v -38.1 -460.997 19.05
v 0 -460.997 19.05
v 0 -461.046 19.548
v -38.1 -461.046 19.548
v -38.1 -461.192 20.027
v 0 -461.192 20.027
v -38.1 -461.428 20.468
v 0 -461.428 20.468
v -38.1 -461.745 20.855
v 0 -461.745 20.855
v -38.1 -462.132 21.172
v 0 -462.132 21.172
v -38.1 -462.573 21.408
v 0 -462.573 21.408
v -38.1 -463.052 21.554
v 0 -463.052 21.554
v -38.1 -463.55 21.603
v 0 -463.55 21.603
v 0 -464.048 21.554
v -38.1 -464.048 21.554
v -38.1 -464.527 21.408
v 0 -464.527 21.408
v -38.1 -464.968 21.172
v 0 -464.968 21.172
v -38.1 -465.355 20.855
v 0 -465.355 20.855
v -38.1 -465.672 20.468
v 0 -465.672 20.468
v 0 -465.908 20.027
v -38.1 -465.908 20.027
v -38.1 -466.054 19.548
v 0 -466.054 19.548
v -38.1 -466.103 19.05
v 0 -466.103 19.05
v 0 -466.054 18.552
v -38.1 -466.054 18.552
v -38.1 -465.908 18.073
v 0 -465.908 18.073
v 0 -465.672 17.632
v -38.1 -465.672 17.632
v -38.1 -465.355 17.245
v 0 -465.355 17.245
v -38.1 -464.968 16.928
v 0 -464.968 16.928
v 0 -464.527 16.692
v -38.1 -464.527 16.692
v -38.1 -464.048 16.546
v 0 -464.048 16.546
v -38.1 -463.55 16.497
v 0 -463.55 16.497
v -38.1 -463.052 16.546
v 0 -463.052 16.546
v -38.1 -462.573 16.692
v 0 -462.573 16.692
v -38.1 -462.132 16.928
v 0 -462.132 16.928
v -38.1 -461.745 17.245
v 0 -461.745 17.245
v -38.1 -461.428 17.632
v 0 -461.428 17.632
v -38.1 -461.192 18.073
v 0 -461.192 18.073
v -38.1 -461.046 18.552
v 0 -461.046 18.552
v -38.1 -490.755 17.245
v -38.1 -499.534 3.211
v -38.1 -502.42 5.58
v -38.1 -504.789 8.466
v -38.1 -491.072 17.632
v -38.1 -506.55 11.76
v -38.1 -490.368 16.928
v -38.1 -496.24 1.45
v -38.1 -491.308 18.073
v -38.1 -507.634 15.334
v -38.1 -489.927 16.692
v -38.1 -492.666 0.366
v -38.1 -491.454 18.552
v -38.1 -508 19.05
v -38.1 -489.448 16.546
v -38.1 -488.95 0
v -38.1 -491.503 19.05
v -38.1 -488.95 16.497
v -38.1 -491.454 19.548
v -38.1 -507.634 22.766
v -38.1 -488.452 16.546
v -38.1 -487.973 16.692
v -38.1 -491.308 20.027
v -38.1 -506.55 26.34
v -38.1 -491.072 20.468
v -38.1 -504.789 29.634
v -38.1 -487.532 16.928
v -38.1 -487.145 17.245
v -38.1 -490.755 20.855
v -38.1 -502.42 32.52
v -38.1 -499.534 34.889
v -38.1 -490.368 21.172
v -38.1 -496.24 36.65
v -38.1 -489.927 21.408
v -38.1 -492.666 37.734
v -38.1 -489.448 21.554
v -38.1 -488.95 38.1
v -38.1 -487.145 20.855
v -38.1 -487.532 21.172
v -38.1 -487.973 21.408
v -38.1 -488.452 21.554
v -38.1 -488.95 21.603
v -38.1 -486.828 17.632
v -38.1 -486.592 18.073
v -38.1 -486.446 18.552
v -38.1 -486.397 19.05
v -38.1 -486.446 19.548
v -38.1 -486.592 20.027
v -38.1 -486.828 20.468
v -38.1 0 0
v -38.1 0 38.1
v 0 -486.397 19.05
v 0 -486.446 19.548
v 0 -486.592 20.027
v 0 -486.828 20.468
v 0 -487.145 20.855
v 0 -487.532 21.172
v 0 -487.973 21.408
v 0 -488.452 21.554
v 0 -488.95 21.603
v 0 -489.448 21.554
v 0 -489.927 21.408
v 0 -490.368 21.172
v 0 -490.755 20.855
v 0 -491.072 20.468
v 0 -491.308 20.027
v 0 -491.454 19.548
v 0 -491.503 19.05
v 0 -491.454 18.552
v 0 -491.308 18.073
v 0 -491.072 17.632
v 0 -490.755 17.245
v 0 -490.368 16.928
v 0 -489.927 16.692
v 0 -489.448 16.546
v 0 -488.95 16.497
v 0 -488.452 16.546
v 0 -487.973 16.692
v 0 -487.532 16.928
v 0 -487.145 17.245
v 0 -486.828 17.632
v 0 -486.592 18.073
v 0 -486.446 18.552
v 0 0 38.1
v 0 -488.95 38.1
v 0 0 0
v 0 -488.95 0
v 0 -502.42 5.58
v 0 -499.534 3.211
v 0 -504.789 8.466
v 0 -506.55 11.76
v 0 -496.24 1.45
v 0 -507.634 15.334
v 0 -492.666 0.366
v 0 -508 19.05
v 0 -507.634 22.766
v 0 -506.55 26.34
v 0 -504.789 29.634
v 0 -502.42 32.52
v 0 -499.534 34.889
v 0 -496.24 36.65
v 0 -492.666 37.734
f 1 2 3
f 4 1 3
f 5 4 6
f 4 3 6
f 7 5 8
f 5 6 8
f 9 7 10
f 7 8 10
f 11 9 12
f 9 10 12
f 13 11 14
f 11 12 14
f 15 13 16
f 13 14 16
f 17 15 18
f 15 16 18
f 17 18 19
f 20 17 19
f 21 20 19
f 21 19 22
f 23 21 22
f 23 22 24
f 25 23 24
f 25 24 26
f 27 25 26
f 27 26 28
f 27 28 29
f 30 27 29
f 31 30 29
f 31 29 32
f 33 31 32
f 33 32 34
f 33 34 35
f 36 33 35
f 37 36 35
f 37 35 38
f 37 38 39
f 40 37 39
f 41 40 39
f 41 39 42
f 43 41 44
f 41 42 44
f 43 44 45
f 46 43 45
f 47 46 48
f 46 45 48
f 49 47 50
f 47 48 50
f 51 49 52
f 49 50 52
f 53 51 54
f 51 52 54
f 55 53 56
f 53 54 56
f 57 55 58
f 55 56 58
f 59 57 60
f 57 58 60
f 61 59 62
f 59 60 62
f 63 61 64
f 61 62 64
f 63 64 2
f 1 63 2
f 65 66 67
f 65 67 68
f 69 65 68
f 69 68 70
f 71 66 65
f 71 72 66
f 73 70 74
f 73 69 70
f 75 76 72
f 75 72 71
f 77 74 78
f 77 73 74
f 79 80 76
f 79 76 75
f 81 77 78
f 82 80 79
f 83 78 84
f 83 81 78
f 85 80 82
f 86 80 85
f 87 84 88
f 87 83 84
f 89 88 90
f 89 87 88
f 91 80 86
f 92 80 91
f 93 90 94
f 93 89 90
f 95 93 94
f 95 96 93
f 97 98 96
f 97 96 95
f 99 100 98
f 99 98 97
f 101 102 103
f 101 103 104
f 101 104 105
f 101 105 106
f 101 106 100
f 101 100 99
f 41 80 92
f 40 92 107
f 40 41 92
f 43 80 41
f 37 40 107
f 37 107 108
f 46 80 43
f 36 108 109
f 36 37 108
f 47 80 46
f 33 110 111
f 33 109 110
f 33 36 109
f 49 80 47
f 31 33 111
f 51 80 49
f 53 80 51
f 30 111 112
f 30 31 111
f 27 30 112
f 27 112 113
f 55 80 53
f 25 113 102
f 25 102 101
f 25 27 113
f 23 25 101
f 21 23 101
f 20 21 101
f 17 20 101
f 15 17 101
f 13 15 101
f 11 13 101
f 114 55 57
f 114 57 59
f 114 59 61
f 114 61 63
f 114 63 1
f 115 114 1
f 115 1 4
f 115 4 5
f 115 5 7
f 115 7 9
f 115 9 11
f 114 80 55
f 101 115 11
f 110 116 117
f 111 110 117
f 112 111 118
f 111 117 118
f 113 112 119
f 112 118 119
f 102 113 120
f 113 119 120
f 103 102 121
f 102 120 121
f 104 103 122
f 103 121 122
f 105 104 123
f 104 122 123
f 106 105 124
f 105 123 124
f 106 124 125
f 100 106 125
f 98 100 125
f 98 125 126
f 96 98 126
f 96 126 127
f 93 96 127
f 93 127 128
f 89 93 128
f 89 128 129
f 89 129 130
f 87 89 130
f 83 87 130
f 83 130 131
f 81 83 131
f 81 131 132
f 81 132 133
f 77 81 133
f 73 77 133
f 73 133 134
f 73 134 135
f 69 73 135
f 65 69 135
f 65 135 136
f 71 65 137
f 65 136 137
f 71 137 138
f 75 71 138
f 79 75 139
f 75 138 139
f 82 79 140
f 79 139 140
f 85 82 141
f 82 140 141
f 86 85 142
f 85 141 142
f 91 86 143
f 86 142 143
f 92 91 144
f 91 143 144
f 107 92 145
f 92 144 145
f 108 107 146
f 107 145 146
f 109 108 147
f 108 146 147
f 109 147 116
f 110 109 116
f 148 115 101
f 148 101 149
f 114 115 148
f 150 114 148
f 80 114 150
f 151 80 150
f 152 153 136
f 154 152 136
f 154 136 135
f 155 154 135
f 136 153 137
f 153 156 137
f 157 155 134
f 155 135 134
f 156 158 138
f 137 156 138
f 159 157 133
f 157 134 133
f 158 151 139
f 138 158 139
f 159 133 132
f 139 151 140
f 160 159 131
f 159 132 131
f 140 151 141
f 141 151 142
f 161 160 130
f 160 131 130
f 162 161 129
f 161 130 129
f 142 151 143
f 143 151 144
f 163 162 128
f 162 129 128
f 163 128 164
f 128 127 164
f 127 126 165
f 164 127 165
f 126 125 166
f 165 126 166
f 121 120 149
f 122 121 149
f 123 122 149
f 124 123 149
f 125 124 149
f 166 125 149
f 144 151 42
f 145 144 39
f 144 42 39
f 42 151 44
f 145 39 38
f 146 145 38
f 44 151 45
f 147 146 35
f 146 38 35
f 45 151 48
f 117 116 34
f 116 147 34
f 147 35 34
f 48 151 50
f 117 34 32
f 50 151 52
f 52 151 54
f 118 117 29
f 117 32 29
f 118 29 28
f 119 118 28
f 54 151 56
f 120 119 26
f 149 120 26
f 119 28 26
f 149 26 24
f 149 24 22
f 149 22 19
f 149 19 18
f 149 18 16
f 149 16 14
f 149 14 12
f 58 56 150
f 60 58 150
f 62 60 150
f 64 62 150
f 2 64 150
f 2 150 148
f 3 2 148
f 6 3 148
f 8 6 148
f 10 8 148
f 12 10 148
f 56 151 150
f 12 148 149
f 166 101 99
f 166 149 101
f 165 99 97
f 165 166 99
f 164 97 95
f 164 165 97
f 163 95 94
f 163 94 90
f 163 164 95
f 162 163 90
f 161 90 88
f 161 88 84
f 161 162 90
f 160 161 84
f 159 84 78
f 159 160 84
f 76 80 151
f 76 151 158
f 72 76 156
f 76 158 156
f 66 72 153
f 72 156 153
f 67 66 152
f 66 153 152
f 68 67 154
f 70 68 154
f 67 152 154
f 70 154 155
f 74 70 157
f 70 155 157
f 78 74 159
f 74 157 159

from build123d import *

# Parameters (mm, degrees)
F0_W     = 38.1
F0_H     = 38.1
F1_DEPTH = 508
F2_R     = 19.04999
F4_D     = 5.1054


# Not quite as in the source:
# - a fillet or chamfer is up to 0.001 mm smaller than in the source, because OpenCascade refuses the exact size


with BuildPart() as f1:
    # F0 (on Front) → F1 (new body)
    with BuildSketch(Plane.XZ):
        with Locations((-19.05, 19.05)):
            Rectangle(F0_W, F0_H)
    extrude(amount=F1_DEPTH)

    # F2 (radius 19.05 in the source; OpenCascade refuses exactly that, so slightly less here)
    f2_edges = [f1.edges().sort_by_distance(p)[0] for p in [
        (-19.05, -508, 38.1),
        (-19.05, -508, 0),
    ]]
    fillet(f2_edges, radius=F2_R)

    # F4 (through all)
    with Locations(Plane(origin=(-38.1, 0, 0), x_dir=(0, -1, 0), z_dir=(-1, 0, 0))):
        with Locations((488.95, 19.05), (463.55, 19.05)):
            Hole(F4_D / 2)


solid = f1.part
